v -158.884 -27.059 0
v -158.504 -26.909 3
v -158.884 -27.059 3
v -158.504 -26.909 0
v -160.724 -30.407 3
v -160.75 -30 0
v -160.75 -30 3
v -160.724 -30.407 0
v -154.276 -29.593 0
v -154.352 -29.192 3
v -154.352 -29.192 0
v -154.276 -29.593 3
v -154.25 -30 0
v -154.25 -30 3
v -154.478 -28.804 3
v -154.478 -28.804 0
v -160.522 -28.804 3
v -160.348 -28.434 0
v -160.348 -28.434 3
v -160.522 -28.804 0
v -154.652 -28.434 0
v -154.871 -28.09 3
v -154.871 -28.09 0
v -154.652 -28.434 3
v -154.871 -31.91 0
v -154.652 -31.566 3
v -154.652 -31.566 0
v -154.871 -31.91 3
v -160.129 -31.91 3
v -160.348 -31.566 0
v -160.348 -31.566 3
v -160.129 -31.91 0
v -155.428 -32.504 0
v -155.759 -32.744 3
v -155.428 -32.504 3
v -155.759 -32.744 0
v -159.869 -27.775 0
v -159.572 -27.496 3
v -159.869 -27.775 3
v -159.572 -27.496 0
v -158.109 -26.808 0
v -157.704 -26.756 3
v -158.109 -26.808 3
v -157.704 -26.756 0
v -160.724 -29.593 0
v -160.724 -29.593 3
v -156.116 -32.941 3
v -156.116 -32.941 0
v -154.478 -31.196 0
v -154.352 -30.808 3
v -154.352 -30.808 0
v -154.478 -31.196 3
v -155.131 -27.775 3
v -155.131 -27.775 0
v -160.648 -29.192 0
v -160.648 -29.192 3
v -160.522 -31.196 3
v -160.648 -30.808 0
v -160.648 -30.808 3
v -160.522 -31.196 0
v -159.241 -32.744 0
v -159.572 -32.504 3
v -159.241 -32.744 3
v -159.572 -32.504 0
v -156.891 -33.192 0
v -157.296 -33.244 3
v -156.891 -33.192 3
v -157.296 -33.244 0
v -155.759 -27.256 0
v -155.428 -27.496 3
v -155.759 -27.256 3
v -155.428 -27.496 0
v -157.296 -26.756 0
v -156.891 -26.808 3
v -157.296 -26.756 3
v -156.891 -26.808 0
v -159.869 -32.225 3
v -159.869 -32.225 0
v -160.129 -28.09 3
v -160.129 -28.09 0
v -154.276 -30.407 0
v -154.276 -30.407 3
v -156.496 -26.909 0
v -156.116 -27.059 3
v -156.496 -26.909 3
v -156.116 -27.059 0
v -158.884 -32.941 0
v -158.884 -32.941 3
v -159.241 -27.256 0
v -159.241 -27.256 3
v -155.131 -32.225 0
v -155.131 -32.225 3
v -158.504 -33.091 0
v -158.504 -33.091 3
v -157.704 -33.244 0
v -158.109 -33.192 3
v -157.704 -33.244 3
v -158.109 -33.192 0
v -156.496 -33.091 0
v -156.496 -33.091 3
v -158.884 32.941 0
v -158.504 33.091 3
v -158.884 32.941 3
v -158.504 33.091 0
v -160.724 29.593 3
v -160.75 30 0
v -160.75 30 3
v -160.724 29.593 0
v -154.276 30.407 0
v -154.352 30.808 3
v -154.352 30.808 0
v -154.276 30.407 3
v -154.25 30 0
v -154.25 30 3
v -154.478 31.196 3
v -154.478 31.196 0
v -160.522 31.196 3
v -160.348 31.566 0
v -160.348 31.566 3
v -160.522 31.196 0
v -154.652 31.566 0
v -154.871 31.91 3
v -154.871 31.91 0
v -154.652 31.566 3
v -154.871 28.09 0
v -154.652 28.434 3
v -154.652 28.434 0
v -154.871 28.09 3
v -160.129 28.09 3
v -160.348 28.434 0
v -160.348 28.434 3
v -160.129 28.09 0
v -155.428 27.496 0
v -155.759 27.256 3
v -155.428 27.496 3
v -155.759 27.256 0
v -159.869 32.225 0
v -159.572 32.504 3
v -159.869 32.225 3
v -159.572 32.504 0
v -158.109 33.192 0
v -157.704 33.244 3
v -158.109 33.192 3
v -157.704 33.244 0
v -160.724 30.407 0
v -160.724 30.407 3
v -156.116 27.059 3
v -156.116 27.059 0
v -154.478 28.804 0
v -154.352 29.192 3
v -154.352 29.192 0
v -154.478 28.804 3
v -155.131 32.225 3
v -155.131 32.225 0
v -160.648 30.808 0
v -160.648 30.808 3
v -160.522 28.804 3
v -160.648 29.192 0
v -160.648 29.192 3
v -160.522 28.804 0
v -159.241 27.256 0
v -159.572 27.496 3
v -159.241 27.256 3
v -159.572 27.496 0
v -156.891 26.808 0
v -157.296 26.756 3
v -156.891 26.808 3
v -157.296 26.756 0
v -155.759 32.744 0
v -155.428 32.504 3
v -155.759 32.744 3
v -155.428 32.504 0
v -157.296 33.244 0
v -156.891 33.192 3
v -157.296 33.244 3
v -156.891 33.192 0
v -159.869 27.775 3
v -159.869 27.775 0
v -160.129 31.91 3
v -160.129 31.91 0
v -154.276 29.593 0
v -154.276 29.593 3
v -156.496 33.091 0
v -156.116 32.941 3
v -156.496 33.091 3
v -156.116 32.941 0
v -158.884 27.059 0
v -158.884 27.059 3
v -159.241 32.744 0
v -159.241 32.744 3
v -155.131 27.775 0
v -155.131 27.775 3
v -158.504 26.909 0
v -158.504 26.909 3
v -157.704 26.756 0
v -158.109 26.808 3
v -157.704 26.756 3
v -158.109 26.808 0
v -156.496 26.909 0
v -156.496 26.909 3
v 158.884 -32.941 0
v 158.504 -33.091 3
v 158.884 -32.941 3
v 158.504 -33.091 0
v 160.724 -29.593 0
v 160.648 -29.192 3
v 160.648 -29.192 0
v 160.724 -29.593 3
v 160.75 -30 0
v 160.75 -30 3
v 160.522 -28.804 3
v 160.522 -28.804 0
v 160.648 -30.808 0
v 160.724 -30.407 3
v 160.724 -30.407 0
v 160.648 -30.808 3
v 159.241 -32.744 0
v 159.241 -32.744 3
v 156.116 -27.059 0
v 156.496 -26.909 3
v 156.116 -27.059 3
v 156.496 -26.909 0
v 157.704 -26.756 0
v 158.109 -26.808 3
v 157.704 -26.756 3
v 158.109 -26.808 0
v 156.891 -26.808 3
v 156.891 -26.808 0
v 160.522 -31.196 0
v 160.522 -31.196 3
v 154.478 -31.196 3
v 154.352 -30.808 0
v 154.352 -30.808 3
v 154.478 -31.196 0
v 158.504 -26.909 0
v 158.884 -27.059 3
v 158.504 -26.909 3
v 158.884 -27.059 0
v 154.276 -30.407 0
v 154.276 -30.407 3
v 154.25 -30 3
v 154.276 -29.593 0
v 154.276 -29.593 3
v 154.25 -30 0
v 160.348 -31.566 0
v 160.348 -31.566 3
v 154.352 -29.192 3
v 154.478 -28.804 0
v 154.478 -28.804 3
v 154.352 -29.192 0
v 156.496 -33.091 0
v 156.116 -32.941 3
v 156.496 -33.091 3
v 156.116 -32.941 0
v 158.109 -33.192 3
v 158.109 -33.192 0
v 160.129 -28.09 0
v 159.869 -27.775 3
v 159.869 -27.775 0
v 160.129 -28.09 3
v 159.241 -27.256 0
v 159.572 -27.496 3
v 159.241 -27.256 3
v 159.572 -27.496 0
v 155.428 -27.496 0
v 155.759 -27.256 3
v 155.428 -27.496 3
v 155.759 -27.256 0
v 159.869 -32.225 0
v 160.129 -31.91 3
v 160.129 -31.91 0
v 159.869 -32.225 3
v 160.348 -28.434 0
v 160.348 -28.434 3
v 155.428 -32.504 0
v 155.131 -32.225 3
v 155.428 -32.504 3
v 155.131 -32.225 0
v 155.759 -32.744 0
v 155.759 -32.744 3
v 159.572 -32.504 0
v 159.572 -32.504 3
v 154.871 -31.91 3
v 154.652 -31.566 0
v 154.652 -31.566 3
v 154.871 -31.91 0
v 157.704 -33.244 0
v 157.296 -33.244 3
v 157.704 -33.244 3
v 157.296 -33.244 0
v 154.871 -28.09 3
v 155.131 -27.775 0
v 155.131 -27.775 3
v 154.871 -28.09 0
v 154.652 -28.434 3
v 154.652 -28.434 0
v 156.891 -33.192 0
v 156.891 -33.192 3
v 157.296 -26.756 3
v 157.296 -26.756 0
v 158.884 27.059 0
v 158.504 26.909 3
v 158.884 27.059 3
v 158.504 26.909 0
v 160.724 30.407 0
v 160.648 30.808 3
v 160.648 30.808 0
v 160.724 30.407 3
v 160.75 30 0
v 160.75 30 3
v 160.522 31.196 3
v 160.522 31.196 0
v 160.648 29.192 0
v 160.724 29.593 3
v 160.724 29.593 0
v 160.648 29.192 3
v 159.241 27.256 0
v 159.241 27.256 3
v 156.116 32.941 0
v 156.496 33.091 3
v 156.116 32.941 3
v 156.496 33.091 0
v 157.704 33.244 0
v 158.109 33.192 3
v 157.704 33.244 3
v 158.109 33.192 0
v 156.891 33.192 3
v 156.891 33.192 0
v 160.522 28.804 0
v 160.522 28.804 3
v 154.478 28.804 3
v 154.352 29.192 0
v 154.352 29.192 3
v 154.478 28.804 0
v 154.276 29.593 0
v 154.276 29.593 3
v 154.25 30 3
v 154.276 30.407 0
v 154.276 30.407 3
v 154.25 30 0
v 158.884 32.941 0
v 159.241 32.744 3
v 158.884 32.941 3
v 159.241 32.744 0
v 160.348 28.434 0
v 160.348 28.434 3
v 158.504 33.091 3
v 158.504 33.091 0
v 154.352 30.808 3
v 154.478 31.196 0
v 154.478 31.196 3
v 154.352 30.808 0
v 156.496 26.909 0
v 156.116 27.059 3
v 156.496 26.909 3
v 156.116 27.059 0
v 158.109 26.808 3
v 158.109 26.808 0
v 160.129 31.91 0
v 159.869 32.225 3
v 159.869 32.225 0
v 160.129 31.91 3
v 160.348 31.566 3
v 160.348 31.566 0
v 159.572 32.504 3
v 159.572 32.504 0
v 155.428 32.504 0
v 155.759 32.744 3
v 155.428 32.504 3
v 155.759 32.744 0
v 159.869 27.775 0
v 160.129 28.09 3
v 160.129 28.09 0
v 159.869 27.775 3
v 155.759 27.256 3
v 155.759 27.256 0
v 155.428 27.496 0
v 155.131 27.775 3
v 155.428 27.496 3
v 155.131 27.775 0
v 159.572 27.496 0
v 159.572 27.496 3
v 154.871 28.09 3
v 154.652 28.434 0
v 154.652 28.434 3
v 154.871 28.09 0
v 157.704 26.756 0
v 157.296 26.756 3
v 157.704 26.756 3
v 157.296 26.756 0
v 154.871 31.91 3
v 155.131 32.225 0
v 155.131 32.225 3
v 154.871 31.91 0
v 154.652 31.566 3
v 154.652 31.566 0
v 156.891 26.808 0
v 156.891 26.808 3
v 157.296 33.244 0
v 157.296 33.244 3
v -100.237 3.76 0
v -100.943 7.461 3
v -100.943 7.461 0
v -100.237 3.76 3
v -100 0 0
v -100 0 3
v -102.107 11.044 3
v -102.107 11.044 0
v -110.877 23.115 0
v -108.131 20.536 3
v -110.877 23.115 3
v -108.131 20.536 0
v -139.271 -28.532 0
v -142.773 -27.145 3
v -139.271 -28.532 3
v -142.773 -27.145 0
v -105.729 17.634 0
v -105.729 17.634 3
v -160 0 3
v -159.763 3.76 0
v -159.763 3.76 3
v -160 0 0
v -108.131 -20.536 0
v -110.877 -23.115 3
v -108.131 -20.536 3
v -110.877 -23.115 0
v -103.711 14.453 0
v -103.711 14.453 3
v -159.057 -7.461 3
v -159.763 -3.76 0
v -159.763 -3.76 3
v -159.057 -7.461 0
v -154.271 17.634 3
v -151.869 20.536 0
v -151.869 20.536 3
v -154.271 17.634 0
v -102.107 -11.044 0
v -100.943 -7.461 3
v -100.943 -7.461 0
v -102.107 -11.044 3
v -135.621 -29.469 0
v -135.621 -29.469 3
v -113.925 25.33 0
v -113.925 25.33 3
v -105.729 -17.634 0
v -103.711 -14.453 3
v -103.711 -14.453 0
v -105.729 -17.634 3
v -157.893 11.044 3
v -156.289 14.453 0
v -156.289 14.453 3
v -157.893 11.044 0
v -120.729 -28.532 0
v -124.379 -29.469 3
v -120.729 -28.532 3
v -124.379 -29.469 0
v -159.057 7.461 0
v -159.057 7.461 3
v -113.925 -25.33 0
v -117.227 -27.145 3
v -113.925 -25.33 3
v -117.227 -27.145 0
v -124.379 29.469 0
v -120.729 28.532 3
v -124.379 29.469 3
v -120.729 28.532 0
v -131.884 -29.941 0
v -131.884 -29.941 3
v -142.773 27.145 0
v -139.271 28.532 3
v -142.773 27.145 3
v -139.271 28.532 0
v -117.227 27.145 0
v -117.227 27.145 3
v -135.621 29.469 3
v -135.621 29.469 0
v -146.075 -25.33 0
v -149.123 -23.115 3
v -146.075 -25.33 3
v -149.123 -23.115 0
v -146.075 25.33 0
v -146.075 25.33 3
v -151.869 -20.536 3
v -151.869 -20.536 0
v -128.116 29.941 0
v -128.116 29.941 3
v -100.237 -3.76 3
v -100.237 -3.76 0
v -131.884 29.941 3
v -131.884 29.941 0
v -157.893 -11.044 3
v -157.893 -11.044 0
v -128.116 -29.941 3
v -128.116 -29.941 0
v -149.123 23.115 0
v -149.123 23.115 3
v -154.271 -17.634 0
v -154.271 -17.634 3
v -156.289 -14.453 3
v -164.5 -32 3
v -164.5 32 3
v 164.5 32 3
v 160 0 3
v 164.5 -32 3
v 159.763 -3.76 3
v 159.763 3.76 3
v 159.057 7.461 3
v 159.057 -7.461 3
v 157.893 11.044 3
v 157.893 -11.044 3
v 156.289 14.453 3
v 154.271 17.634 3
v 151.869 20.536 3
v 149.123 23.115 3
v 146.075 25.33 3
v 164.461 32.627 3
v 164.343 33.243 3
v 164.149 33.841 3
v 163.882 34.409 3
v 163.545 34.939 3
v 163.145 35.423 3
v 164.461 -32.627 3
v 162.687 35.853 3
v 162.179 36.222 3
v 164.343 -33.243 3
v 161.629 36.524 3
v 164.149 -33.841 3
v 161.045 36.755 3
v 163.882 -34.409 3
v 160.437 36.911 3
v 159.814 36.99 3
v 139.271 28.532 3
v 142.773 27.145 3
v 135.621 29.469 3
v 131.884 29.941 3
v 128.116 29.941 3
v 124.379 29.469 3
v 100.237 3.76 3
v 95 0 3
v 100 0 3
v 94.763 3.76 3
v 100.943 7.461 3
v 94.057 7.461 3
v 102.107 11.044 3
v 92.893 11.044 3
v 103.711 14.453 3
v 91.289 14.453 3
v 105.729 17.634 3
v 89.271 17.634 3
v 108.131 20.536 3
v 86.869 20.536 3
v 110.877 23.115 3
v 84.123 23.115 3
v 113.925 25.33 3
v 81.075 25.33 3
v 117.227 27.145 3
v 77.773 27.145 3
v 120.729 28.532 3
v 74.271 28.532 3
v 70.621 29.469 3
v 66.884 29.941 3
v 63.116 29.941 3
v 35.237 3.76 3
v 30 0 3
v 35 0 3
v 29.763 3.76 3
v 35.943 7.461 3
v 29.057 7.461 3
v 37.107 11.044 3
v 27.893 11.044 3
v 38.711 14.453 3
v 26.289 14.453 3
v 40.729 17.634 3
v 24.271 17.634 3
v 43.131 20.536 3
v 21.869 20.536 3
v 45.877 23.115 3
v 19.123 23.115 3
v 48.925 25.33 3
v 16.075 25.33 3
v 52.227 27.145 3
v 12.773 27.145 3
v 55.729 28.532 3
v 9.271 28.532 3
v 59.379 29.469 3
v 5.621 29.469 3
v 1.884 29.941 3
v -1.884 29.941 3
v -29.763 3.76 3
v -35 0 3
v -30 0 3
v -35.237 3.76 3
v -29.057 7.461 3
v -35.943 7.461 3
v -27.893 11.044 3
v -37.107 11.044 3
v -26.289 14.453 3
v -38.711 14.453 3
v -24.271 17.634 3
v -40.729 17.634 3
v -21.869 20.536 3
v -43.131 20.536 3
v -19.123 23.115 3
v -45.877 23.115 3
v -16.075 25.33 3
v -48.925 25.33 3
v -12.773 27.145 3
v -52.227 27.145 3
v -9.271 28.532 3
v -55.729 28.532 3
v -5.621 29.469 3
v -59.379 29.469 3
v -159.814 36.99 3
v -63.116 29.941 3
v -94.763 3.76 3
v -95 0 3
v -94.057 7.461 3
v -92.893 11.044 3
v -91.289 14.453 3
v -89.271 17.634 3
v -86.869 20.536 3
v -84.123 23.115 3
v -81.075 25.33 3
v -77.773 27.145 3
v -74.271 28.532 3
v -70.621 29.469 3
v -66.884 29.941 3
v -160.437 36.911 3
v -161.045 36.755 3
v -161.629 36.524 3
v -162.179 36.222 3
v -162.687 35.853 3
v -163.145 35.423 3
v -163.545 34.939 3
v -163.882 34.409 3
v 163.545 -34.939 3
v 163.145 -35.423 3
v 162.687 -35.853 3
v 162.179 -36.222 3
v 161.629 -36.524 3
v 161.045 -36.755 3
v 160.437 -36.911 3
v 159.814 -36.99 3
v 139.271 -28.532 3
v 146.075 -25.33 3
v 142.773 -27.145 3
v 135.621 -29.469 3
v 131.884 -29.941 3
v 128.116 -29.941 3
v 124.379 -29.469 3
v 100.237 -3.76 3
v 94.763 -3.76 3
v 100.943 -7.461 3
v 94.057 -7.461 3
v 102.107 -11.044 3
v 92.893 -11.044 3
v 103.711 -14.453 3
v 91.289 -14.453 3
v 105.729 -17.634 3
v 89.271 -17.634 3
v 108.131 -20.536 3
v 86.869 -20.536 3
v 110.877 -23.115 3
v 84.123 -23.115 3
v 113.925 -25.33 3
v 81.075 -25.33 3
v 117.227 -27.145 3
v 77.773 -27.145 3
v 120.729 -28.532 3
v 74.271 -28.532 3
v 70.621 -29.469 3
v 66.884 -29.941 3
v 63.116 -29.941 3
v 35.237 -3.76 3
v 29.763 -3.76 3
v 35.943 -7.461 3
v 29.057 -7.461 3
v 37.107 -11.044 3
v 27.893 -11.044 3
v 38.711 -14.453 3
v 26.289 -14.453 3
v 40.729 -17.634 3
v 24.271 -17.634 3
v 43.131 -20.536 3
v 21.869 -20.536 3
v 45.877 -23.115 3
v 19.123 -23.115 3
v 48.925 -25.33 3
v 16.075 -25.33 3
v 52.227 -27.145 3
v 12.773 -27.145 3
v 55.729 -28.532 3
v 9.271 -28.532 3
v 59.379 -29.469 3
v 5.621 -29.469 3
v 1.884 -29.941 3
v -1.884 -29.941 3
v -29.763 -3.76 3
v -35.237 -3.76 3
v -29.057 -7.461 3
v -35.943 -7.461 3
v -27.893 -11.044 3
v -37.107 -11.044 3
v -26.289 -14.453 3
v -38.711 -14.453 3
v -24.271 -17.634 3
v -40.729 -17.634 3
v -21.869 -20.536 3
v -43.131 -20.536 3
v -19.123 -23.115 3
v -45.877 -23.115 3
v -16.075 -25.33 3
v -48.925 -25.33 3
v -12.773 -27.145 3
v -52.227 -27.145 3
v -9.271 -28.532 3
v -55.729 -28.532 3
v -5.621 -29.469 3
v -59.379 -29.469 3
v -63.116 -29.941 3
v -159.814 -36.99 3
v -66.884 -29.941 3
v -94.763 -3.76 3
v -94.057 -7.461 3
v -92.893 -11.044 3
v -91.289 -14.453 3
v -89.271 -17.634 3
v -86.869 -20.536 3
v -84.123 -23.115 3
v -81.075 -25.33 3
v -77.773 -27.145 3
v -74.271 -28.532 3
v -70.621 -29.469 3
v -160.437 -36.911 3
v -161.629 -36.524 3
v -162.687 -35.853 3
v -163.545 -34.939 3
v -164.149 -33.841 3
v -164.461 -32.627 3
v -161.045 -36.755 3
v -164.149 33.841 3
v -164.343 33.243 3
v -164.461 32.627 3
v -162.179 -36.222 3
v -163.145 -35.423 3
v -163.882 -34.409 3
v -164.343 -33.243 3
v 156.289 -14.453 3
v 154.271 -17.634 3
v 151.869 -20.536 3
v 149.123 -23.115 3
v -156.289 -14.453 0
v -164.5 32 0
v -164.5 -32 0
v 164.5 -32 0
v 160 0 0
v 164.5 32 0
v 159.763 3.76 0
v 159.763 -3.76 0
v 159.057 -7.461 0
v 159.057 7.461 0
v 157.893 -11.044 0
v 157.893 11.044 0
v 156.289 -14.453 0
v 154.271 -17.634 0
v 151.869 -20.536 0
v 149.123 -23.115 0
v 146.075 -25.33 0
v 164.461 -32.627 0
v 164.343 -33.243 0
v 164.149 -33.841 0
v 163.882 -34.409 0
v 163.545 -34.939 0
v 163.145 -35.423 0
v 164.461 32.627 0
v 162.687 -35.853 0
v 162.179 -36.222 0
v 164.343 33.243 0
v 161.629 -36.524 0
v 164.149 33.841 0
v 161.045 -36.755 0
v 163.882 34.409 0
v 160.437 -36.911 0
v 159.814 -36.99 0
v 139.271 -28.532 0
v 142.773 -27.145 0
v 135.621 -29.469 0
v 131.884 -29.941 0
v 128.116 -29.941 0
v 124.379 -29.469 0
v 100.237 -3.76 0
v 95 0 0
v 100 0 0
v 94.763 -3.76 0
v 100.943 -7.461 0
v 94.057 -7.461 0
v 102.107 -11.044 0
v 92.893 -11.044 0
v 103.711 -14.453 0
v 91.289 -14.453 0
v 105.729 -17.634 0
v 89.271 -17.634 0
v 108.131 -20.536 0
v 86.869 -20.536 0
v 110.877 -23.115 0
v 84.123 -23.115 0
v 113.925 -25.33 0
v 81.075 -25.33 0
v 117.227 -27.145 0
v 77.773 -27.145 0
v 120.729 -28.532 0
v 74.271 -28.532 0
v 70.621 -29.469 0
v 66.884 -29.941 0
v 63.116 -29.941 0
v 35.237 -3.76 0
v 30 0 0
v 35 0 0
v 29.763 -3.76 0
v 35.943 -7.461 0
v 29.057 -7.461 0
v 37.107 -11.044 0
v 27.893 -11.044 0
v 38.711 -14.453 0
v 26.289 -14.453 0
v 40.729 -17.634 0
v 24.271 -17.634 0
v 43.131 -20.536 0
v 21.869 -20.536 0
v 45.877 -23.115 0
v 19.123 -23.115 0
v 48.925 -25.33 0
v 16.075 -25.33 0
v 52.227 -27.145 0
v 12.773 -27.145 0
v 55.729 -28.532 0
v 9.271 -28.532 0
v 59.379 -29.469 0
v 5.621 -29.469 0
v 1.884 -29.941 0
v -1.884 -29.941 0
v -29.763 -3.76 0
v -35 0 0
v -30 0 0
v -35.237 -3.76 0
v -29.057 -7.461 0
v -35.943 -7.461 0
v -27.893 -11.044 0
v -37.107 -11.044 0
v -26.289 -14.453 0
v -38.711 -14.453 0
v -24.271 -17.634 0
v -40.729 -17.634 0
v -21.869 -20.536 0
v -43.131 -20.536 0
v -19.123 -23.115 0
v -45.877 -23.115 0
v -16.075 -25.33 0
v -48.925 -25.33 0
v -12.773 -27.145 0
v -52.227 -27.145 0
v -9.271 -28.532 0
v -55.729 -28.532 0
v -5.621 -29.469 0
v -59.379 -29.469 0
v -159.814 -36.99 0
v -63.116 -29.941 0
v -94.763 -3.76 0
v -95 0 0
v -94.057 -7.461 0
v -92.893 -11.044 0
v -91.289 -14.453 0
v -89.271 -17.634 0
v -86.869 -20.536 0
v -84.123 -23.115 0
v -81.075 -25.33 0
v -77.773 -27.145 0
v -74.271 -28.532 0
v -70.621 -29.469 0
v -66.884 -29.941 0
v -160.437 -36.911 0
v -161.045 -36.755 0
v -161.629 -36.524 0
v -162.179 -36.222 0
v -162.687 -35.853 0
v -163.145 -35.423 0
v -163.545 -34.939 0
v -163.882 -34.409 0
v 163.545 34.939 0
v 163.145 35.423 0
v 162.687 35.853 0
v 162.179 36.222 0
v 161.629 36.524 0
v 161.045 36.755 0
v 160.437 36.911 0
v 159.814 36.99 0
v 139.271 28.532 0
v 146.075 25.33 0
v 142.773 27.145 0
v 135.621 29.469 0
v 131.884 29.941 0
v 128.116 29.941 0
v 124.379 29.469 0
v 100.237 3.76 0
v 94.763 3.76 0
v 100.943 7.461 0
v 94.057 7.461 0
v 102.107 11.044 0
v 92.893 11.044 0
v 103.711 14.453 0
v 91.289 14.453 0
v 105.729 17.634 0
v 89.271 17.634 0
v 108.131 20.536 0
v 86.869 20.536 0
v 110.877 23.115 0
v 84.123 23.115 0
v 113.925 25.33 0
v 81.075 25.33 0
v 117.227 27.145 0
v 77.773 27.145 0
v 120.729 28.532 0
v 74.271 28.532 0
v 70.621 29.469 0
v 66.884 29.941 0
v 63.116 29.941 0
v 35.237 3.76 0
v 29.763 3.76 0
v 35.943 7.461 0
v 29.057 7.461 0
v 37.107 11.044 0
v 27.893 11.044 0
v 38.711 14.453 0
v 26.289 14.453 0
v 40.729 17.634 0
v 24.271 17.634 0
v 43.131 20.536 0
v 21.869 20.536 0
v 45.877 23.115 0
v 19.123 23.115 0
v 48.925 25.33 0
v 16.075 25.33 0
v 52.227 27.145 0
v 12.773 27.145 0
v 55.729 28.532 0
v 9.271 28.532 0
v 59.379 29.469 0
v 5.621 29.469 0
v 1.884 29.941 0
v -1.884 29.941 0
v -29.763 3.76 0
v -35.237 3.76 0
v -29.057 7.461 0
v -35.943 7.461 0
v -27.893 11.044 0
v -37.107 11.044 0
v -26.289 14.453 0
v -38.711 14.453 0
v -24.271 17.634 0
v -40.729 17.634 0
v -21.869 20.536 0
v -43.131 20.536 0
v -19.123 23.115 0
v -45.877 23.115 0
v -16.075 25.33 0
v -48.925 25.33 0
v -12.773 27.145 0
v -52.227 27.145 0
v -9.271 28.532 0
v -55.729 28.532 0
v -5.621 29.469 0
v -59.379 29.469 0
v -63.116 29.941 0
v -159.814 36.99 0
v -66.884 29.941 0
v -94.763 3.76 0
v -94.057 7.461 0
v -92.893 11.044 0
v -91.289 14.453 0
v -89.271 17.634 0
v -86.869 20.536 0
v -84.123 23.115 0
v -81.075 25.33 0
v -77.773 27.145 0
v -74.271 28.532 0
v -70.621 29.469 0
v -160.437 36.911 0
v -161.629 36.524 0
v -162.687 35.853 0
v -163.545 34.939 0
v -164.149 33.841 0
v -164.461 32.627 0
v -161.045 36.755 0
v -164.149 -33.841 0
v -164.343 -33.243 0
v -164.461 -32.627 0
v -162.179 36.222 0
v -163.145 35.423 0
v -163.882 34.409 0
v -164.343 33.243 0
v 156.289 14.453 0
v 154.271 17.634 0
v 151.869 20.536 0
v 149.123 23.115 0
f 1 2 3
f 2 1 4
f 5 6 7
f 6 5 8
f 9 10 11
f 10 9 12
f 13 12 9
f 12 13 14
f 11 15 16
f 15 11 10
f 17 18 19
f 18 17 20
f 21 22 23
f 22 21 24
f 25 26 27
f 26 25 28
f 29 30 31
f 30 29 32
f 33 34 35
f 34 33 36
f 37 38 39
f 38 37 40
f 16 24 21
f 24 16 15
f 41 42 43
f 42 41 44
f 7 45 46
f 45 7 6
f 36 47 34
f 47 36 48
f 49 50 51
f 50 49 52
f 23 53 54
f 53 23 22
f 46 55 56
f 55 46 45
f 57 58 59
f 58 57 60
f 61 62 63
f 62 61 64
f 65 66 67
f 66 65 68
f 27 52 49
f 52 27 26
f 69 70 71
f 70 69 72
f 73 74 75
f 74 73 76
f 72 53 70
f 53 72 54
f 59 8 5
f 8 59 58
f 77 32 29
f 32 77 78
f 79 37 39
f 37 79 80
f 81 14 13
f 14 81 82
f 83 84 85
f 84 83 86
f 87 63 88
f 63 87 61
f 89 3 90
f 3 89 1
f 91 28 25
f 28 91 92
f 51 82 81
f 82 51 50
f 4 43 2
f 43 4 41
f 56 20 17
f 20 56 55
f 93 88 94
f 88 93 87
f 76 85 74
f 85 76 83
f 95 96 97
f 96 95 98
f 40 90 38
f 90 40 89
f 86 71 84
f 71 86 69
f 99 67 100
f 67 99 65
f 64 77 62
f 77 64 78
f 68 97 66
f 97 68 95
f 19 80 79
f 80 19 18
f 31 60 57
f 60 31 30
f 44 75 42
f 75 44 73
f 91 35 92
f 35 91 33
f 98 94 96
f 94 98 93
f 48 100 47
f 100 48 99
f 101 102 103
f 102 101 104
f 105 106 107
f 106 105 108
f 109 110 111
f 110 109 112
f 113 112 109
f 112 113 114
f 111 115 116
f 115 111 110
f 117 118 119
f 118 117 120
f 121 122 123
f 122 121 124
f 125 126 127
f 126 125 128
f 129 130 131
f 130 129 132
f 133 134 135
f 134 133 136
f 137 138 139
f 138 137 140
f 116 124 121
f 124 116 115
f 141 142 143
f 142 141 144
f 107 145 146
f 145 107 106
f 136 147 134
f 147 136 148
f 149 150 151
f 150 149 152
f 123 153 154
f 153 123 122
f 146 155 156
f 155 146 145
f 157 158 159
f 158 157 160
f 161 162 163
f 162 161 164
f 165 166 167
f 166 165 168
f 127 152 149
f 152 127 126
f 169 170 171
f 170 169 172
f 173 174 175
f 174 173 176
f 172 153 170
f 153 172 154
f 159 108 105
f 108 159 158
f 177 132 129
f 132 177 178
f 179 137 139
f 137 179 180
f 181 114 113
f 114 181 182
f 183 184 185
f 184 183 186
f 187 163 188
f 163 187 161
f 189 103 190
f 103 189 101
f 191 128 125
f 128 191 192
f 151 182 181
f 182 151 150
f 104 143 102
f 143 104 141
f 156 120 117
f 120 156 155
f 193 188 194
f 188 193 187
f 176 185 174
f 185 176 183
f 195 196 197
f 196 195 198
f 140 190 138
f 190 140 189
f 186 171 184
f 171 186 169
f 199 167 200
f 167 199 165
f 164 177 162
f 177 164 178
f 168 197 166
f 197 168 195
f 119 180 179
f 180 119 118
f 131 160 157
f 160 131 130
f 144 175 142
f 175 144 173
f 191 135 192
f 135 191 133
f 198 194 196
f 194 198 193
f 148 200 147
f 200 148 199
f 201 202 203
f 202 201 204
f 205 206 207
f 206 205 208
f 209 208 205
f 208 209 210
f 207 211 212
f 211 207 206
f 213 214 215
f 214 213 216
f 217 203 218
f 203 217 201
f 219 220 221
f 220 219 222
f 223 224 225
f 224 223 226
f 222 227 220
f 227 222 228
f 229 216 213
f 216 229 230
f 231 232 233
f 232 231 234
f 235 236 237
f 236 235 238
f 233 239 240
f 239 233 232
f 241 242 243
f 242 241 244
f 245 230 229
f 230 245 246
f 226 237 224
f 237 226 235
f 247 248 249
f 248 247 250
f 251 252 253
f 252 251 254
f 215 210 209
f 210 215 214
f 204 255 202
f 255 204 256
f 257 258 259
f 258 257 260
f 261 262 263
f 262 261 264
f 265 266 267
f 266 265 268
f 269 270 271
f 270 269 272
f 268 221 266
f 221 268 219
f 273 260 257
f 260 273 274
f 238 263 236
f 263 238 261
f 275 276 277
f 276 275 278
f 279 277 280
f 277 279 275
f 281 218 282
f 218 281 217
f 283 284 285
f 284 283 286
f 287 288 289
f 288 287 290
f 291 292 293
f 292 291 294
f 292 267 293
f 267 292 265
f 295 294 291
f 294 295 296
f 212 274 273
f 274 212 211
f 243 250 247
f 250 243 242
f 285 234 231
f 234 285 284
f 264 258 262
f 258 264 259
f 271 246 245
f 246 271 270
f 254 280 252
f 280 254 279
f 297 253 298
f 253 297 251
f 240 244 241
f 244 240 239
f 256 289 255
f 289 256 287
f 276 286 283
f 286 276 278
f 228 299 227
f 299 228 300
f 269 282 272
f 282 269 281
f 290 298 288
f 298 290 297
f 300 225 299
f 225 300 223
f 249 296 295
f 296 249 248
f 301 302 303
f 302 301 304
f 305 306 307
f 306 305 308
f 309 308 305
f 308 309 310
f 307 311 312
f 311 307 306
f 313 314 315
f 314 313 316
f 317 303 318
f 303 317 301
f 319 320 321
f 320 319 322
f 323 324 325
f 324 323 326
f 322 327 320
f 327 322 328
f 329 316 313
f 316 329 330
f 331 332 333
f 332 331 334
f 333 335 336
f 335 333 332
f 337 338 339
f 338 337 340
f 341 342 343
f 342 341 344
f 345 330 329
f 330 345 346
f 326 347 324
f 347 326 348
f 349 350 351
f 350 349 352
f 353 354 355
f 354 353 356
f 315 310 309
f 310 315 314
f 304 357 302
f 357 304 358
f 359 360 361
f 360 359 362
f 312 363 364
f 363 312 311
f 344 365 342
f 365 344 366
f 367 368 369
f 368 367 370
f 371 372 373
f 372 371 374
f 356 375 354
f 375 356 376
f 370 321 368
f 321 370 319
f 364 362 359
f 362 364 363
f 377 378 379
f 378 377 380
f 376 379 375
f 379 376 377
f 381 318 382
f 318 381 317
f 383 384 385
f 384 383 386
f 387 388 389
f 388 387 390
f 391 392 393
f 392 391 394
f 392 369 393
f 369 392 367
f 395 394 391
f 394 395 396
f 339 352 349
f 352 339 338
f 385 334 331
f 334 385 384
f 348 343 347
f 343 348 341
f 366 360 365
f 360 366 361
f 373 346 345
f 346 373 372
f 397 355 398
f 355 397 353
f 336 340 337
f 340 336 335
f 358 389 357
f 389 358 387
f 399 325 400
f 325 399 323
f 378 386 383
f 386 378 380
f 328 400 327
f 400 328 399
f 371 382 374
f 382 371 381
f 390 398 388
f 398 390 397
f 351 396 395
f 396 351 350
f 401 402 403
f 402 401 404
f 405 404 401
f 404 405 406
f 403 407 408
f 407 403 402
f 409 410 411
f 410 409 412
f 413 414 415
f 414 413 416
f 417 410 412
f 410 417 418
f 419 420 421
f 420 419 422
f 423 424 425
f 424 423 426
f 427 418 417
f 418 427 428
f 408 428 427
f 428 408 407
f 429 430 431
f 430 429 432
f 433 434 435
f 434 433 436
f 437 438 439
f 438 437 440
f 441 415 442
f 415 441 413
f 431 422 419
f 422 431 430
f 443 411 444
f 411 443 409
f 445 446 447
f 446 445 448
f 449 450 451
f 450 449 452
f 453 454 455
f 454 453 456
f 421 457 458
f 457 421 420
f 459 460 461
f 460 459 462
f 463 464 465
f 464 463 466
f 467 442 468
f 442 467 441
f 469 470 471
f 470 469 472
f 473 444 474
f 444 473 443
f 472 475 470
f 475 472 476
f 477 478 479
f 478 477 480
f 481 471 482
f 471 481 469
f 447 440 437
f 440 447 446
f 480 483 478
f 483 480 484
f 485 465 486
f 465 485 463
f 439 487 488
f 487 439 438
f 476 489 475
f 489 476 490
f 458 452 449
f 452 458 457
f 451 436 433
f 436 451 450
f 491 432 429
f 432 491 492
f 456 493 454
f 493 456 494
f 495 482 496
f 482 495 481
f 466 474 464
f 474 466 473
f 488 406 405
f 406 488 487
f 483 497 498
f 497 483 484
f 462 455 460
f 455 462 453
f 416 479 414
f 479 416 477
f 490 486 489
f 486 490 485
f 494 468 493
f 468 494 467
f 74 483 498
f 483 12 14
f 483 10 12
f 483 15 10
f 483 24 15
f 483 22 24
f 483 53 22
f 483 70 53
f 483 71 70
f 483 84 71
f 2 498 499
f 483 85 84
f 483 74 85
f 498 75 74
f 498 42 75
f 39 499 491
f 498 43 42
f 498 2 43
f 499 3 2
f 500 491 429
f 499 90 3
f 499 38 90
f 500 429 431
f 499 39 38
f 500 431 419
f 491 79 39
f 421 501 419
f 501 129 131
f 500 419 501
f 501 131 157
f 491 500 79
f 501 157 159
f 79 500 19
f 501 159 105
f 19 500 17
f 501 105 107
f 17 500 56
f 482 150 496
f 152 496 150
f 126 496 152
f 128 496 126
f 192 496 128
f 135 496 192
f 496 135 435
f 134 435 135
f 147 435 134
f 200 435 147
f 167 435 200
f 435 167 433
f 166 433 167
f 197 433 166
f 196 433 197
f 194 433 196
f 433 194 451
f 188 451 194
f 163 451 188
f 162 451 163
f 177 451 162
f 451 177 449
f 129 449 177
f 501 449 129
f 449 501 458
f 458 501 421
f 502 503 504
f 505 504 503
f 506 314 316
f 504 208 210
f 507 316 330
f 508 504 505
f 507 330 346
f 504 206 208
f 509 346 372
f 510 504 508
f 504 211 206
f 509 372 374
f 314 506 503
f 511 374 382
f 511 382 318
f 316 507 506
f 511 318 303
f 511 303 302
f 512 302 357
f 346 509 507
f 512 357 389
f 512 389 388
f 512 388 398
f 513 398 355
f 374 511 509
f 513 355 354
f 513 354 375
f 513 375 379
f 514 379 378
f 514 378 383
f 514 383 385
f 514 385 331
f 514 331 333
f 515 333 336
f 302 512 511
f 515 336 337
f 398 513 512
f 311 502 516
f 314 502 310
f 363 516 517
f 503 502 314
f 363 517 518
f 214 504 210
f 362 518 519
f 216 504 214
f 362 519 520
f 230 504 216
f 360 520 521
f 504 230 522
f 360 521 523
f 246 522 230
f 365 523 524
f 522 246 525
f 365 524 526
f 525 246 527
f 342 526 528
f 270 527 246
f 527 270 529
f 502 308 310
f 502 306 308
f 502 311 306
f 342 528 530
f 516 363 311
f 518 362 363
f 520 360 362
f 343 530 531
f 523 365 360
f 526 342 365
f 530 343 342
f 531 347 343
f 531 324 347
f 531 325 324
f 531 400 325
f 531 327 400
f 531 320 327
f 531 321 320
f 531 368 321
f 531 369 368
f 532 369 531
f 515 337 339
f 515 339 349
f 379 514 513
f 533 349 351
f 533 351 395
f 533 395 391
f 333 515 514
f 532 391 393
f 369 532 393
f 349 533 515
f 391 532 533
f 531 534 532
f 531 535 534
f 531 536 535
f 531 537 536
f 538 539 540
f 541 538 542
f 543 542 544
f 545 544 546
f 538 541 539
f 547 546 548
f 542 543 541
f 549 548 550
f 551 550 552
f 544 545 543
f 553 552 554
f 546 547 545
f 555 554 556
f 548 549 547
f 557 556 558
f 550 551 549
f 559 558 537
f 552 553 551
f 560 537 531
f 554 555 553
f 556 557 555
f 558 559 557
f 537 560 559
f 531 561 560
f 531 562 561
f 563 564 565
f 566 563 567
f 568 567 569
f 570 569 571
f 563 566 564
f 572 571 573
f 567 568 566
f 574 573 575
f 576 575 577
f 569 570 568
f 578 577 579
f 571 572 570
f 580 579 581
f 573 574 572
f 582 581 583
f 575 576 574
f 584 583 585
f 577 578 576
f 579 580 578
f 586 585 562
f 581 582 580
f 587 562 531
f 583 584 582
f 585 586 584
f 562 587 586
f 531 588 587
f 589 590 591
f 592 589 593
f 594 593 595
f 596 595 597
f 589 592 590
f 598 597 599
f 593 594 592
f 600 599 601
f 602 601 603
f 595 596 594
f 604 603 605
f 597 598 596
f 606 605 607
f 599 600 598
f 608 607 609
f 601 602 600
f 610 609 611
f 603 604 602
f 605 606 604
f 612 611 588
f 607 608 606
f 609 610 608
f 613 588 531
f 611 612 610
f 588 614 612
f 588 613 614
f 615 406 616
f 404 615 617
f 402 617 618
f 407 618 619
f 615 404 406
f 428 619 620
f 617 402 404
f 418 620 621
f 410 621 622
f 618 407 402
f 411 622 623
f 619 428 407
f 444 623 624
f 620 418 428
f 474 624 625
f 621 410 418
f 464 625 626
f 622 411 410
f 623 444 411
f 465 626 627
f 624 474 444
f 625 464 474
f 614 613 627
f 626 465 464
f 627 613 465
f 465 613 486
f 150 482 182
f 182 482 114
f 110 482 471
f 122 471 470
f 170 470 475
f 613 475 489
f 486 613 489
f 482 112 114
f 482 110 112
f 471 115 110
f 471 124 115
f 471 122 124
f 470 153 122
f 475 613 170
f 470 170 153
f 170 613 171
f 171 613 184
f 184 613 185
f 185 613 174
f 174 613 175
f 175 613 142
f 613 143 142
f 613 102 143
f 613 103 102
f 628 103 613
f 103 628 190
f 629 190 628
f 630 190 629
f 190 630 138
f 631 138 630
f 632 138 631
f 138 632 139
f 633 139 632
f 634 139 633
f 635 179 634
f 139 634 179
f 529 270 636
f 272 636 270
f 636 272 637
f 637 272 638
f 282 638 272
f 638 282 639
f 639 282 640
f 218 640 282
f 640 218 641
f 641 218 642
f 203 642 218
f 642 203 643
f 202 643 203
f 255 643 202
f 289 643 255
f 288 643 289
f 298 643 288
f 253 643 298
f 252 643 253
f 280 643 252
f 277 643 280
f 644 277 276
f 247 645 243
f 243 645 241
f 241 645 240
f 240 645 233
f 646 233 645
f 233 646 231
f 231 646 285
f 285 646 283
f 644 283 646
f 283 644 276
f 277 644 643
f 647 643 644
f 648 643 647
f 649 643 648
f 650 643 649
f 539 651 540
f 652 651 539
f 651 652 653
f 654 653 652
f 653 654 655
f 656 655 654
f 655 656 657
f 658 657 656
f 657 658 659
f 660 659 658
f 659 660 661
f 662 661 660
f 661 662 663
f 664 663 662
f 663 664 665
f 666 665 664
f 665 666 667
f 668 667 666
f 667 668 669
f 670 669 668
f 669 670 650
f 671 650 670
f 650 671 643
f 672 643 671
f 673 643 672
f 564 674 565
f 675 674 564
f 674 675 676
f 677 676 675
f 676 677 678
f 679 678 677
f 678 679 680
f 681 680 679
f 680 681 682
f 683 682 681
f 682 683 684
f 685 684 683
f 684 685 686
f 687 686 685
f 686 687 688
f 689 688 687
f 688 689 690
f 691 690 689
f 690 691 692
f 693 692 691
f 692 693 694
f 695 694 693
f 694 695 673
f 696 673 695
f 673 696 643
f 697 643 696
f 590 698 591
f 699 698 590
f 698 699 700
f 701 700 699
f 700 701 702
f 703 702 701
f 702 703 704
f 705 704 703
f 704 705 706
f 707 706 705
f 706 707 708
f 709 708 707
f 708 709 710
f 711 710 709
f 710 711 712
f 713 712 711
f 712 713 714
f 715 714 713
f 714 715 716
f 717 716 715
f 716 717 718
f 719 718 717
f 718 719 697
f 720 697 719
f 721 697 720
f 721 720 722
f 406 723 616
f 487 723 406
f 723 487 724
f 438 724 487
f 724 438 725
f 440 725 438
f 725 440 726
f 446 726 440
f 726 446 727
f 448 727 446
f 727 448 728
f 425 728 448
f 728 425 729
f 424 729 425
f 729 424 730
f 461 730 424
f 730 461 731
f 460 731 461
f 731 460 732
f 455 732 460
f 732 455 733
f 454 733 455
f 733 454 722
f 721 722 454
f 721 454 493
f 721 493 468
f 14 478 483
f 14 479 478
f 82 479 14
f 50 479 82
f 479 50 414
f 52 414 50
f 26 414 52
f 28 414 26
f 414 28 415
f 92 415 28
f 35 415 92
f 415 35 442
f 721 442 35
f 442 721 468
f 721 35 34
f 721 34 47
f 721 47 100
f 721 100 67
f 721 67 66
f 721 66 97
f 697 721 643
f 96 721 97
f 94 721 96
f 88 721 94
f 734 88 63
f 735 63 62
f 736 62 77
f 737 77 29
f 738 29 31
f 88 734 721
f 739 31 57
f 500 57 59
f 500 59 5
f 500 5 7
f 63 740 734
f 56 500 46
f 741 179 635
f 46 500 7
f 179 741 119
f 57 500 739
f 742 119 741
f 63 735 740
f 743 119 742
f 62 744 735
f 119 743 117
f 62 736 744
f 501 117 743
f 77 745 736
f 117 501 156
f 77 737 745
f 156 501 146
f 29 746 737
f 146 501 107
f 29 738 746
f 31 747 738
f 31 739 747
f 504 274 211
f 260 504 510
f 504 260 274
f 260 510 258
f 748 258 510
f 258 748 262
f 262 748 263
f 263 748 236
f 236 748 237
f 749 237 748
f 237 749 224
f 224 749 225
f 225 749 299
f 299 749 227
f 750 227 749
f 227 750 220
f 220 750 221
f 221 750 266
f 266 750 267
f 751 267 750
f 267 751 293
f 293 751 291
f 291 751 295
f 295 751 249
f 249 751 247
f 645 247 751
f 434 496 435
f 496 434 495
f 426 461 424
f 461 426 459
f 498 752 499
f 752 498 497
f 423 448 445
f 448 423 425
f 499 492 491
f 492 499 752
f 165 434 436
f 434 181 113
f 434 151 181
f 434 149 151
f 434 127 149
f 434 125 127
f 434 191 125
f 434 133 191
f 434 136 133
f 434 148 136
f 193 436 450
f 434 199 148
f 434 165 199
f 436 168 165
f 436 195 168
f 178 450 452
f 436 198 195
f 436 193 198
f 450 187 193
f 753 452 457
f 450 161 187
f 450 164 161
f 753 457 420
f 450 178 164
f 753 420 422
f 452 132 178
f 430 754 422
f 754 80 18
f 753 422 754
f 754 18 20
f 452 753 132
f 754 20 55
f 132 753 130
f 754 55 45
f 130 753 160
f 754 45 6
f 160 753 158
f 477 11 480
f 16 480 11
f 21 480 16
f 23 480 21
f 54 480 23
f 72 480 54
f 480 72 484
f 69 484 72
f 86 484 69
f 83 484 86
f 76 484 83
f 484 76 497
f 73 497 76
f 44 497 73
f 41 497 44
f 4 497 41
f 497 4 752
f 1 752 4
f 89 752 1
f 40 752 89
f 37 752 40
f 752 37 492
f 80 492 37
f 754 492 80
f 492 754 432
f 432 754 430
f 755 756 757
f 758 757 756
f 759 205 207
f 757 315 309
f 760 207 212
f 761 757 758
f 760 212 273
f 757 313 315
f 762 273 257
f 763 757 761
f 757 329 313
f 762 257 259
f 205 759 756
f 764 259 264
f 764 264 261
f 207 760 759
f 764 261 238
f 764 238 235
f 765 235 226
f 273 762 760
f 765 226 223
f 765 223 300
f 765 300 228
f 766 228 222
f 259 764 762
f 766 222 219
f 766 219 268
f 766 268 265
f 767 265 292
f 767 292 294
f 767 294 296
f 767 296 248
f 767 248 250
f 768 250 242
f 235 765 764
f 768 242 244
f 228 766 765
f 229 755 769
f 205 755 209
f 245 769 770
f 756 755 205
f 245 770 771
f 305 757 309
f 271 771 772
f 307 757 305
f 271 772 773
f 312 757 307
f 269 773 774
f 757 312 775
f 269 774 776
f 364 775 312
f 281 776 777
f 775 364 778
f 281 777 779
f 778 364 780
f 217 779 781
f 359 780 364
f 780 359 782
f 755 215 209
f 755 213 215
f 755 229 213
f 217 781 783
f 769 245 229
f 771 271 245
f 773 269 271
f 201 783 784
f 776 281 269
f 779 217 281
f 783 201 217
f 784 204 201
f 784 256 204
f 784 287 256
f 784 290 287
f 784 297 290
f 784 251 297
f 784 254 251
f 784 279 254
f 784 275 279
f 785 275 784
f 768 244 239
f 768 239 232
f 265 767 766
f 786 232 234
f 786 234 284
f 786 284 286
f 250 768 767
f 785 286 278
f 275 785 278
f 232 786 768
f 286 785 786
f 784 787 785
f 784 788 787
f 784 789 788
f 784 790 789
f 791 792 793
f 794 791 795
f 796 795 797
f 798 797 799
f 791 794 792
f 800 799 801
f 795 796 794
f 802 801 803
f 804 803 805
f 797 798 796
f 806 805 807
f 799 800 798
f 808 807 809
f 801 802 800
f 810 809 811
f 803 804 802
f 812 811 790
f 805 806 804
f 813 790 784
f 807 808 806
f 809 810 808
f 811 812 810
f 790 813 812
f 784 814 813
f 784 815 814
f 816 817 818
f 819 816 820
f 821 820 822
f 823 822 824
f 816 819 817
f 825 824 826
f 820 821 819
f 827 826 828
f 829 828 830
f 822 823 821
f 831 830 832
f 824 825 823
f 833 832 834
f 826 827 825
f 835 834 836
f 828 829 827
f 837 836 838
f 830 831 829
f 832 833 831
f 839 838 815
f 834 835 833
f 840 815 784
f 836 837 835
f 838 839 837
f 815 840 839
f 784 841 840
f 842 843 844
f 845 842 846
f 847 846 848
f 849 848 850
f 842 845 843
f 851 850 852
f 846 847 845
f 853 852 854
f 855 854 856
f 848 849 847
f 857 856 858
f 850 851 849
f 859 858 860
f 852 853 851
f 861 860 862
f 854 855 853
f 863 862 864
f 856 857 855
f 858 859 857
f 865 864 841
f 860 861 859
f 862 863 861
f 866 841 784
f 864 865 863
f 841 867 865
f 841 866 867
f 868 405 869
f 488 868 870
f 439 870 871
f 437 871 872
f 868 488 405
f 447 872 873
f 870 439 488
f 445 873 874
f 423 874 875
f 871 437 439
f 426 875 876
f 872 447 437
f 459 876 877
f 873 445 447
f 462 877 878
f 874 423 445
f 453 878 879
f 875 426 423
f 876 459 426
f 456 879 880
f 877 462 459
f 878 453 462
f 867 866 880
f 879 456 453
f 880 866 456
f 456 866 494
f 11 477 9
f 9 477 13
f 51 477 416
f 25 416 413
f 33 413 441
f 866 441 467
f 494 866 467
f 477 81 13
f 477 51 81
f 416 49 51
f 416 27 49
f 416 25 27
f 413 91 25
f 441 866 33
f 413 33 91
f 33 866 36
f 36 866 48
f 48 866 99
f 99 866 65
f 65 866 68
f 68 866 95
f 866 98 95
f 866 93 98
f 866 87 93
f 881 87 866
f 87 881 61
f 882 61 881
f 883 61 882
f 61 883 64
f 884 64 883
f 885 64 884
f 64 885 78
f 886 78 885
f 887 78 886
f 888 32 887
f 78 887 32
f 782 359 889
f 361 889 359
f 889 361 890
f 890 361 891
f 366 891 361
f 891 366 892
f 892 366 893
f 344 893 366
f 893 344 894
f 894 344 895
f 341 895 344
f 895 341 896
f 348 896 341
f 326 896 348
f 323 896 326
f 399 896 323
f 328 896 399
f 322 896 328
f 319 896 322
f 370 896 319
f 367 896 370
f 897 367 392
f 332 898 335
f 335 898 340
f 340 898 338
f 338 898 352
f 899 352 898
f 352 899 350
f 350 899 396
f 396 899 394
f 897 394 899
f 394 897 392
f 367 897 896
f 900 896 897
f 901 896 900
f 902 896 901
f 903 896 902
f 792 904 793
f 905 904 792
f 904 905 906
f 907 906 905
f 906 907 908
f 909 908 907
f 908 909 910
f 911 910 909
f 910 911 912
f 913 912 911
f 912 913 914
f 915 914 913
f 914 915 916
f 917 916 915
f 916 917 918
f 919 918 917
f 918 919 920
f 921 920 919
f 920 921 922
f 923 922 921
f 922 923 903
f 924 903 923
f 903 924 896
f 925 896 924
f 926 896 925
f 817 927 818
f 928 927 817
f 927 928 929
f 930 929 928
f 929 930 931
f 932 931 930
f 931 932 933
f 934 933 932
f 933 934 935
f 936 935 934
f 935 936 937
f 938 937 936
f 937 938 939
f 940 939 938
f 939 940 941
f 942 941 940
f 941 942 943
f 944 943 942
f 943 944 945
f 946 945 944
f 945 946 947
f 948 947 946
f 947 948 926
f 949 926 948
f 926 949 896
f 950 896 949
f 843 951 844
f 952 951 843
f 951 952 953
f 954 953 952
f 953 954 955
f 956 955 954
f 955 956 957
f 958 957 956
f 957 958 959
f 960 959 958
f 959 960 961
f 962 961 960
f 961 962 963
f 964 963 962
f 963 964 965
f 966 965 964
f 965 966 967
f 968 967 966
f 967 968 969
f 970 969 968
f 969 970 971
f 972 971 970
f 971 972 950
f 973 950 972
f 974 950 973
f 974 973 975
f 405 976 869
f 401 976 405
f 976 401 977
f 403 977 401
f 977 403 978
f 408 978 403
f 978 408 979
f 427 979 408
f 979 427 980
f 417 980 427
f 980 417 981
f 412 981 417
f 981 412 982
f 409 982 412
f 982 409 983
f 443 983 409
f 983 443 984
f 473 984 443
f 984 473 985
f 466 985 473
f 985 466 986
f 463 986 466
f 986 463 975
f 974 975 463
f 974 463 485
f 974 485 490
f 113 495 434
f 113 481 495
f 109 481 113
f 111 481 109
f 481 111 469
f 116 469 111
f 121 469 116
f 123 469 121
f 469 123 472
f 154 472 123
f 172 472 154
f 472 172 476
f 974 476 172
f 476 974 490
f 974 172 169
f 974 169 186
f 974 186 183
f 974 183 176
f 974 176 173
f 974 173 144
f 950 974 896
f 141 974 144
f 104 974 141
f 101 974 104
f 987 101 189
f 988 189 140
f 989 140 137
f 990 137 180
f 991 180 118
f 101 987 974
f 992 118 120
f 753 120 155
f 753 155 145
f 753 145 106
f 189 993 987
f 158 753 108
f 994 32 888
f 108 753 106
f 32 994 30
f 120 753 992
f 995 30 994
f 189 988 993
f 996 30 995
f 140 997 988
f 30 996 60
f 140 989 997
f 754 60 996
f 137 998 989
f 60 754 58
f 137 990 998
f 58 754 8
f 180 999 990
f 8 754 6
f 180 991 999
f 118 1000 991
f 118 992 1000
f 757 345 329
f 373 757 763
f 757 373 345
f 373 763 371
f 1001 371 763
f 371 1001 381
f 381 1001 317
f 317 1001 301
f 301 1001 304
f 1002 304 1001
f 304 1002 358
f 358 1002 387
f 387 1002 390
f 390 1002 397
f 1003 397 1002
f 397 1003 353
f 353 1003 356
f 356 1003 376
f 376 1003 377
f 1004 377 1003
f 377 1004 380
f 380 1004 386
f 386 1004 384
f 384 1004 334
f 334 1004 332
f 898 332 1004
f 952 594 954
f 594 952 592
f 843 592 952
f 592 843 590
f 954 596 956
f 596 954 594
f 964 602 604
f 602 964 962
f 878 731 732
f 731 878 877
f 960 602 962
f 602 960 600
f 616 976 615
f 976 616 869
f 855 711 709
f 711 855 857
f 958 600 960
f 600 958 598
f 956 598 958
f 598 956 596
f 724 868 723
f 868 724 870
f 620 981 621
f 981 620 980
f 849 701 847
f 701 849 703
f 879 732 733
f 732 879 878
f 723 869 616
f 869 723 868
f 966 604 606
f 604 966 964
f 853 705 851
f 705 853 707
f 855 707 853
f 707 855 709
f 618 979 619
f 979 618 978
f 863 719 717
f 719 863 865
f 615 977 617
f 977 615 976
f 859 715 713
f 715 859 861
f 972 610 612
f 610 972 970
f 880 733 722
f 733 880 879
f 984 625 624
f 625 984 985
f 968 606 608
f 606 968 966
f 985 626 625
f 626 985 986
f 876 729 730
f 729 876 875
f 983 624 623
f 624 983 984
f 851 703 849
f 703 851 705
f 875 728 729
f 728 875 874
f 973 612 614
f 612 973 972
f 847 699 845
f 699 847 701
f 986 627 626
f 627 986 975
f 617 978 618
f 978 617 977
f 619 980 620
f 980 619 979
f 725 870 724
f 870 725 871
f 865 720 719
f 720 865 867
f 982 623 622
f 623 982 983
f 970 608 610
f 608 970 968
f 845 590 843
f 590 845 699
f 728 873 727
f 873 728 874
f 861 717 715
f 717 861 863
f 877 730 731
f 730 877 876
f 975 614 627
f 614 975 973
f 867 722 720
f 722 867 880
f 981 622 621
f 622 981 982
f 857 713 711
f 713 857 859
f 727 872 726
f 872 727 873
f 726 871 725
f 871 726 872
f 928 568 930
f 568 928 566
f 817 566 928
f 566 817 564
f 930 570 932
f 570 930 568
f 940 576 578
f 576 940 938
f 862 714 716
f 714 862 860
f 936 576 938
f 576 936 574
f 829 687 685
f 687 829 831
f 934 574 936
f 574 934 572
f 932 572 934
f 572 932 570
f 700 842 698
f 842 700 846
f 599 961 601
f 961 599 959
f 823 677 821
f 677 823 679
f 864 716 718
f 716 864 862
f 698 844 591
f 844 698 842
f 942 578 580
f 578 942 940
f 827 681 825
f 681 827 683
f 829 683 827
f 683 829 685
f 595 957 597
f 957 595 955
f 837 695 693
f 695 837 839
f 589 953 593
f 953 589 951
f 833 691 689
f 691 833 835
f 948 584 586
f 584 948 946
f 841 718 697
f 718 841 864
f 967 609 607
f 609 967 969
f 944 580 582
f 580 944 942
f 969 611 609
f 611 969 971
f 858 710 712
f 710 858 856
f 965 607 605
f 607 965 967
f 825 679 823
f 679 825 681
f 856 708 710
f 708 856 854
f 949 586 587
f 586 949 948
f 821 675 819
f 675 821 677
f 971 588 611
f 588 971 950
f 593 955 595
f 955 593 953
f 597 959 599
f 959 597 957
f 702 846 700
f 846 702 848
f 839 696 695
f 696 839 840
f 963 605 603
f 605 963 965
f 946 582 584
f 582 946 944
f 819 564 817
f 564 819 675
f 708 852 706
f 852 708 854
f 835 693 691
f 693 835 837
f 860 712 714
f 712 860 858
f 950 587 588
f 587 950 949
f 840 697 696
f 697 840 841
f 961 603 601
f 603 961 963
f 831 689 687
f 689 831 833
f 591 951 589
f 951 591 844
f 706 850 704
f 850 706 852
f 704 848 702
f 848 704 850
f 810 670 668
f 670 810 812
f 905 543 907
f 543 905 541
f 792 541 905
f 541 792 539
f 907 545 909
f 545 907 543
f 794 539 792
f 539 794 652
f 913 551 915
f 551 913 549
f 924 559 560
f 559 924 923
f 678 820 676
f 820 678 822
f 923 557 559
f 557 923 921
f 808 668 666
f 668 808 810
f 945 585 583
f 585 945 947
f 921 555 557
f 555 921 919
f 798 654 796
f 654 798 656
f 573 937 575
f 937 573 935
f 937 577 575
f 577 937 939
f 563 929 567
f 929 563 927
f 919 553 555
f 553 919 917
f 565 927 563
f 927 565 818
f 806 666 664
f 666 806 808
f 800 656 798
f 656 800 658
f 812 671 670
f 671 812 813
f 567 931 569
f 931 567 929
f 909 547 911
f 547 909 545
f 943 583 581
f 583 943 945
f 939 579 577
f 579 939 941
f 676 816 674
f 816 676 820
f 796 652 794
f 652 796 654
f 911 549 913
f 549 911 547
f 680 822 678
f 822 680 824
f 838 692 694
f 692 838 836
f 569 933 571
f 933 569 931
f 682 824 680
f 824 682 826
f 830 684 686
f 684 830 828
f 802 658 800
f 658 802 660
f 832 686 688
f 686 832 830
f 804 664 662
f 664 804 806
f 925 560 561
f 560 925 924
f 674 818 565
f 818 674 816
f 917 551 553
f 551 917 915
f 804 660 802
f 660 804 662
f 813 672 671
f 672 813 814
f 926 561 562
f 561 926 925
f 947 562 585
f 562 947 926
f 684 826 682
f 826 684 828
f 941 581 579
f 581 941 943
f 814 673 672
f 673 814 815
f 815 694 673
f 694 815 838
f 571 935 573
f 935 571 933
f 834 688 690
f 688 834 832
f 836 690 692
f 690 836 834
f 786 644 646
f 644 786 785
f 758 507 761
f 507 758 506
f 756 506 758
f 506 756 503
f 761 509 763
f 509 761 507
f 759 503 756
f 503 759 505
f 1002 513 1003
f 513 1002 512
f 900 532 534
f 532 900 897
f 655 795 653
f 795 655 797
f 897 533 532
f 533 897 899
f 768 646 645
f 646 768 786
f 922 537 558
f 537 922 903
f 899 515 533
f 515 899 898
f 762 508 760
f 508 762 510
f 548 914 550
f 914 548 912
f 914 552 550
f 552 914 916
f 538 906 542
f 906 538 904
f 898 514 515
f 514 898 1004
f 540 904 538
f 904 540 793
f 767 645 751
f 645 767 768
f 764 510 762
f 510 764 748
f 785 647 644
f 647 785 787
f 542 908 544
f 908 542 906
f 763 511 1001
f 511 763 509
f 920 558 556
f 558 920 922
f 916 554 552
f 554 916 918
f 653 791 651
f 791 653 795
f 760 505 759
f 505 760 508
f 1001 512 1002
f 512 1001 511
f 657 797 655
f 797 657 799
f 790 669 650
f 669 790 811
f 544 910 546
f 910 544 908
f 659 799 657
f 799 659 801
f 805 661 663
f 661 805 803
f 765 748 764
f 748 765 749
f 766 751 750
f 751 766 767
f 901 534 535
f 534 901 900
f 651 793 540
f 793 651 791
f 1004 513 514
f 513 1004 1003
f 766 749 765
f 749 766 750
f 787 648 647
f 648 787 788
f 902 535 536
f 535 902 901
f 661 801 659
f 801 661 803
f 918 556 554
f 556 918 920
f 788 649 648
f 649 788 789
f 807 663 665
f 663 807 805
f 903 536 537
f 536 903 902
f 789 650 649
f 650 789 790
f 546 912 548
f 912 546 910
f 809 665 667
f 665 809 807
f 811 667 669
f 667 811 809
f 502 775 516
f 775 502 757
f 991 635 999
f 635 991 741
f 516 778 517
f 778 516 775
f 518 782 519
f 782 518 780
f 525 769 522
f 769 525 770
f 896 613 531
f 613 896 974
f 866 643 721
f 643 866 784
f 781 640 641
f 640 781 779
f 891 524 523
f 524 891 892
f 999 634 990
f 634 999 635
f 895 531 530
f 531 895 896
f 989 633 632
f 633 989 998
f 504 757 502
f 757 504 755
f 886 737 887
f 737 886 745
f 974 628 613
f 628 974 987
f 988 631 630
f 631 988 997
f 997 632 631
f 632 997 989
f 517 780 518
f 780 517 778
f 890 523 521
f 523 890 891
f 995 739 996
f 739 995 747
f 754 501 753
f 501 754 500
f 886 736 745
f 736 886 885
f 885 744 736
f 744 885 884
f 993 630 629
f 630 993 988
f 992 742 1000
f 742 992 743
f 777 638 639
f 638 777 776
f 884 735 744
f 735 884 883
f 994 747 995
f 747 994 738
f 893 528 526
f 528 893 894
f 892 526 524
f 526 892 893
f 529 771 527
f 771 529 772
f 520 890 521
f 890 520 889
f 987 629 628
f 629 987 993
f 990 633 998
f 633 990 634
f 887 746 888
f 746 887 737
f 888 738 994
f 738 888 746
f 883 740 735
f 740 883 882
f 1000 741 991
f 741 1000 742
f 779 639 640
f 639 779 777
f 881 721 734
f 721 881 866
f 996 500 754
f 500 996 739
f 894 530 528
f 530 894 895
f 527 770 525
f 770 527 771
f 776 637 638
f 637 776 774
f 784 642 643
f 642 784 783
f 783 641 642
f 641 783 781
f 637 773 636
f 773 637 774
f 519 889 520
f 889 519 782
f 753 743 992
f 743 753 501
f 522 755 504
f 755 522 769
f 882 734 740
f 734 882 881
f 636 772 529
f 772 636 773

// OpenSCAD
$fn = 50;


difference() {
	union() {
		hull() {
			translate(v = [-159.5000000000, 32.0000000000, 0]) {
				cylinder(h = 3, r = 5);
			}
			translate(v = [159.5000000000, 32.0000000000, 0]) {
				cylinder(h = 3, r = 5);
			}
			translate(v = [-159.5000000000, -32.0000000000, 0]) {
				cylinder(h = 3, r = 5);
			}
			translate(v = [159.5000000000, -32.0000000000, 0]) {
				cylinder(h = 3, r = 5);
			}
		}
	}
	union() {
		#translate(v = [-157.5000000000, -30.0000000000, -100.0000000000]) {
			cylinder(h = 200, r = 3.2500000000);
		}
		#translate(v = [-157.5000000000, 30.0000000000, -100.0000000000]) {
			cylinder(h = 200, r = 3.2500000000);
		}
		#translate(v = [157.5000000000, -30.0000000000, -100.0000000000]) {
			cylinder(h = 200, r = 3.2500000000);
		}
		#translate(v = [157.5000000000, 30.0000000000, -100.0000000000]) {
			cylinder(h = 200, r = 3.2500000000);
		}
		#translate(v = [-130.0000000000, 0, 0]) {
			cylinder(h = 3, r = 30.0000000000);
		}
		#translate(v = [-65.0000000000, 0, 0]) {
			cylinder(h = 3, r = 30.0000000000);
		}
		#cylinder(h = 3, r = 30.0000000000);
		#translate(v = [65.0000000000, 0, 0]) {
			cylinder(h = 3, r = 30.0000000000);
		}
		#translate(v = [130.0000000000, 0, 0]) {
			cylinder(h = 3, r = 30.0000000000);
		}
	}
}
